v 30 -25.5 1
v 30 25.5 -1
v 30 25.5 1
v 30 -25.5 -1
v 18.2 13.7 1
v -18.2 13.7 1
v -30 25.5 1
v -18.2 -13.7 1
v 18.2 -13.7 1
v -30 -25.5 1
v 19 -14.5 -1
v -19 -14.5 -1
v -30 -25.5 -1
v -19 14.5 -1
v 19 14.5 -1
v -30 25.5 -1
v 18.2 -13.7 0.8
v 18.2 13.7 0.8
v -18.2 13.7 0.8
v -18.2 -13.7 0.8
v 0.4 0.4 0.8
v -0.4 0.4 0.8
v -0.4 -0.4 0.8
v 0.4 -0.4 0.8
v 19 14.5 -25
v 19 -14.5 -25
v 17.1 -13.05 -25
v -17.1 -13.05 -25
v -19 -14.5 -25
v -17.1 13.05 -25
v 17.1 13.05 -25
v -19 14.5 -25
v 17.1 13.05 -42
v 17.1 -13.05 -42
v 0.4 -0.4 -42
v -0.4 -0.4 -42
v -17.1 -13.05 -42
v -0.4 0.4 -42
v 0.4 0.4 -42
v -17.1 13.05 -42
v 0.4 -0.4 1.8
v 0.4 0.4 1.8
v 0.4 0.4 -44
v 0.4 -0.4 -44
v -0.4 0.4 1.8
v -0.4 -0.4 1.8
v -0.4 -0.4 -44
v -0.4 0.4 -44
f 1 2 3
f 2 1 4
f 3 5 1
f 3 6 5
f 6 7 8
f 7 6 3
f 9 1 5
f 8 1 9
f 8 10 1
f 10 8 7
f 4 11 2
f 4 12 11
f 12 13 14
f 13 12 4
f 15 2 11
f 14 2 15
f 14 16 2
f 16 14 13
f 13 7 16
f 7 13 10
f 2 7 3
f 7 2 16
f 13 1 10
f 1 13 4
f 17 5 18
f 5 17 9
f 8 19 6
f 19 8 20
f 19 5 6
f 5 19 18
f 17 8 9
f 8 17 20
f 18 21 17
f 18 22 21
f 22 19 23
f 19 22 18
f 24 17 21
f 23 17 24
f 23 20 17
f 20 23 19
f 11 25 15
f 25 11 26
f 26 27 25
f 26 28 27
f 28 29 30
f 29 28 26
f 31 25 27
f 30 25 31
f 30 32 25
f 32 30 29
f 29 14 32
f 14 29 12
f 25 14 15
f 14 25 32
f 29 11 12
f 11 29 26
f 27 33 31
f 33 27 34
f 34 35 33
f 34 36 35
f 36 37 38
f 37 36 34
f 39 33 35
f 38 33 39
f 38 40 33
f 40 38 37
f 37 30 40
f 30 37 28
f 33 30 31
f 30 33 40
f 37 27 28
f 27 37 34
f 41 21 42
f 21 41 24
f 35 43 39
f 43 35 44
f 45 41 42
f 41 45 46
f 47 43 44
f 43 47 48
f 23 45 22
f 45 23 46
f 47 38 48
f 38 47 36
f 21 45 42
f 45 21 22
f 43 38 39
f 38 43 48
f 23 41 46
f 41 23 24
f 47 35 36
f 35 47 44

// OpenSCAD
// Parameters
cutout_width_mm = 36; //[18:72:0.1]
cutout_height_mm = 27; //[13.5:54:0.1]
panel_thickness_mm = 2; //[1:6:0.1]
clearance_mm = 0.2; //[0:1:0.05]
include_mounting_holes = 0; //[0:1:1]
mounting_hole_diameter_mm = 3.2; //[2:6.4:0.1]
mounting_hole_pitch_x_mm = 40; //[20:80:0.1]
mounting_hole_pitch_y_mm = 0; //[0:40:0.1]
include_flange_clearance = 1; //[0:1:1]
flange_width_mm = 50; //[30:100:0.1]
flange_height_mm = 35; //[20:70:0.1]
panel_margin_mm = 12; //[6:30:0.5]
envelope_thickness_mm = 0.8; //[0.4:3:0.1]
carrier_web_thickness_mm = 0.8; //[0.4:3:0.1]
overlap_mm = 1; //[0.5:2:0.1]
iec_body_depth_mm = 25; //[12:60:0.5]
iec_body_clearance_mm = 1; //[0:5:0.1]
mod_block_depth_mm = 18; //[8:50:0.5]

// IEC Module - complete geometry
module iec() {
  color("DimGray") {
    // IEC Body
    cube([cutout_width_mm + 2*iec_body_clearance_mm, 
          cutout_height_mm + 2*iec_body_clearance_mm, 
          iec_body_depth_mm], center=true);
  }
}

// Mod Module - complete geometry
module mod() {
  color("Black") {
    // Mod Block
    cube([(cutout_width_mm + 2*iec_body_clearance_mm) * 0.9, 
          (cutout_height_mm + 2*iec_body_clearance_mm) * 0.9, 
          mod_block_depth_mm], center=true);
  }
}

// Panel with cutouts
module panel_with_cutouts() {
  color("Silver") {
    difference() {
      // Panel Reference Face
      cube([cutout_width_mm + 2*panel_margin_mm, 
            cutout_height_mm + 2*panel_margin_mm, 
            panel_thickness_mm], center=true);
      // Panel Cutout Rect
      translate([0, 0, 0])
        cube([cutout_width_mm + 2*clearance_mm, 
              cutout_height_mm + 2*clearance_mm, 
              panel_thickness_mm + 2*overlap_mm], center=true);
      // Mounting Holes
      if (include_mounting_holes) {
        translate([mounting_hole_pitch_x_mm/2, mounting_hole_pitch_y_mm/2, 0])
          cylinder(h=panel_thickness_mm + 2*overlap_mm, 
                   r=(mounting_hole_diameter_mm + 2*clearance_mm)/2, center=true);
        translate([-mounting_hole_pitch_x_mm/2, -mounting_hole_pitch_y_mm/2, 0])
          cylinder(h=panel_thickness_mm + 2*overlap_mm, 
                   r=(mounting_hole_diameter_mm + 2*clearance_mm)/2, center=true);
      }
    }
  }
}

// Flange Clearance Envelope
module flange_clearance_envelope() {
  if (include_flange_clearance) {
    color("Silver") {
      translate([0, 0, panel_thickness_mm/2 + envelope_thickness_mm/2 - overlap_mm])
        cube([flange_width_mm + 2*clearance_mm, 
              flange_height_mm + 2*clearance_mm, 
              envelope_thickness_mm], center=true);
    }
  }
}

// Carrier Web
module carrier_web() {
  color("Silver") {
    translate([0, 0, (envelope_thickness_mm - iec_body_depth_mm - mod_block_depth_mm)/2])
      cube([carrier_web_thickness_mm, 
            carrier_web_thickness_mm, 
            panel_thickness_mm + envelope_thickness_mm + iec_body_depth_mm + mod_block_depth_mm], center=true);
  }
}

// Assembly
module assembly() {
  panel_with_cutouts();
  flange_clearance_envelope();
  translate([0, 0, -panel_thickness_mm/2 - iec_body_depth_mm/2 + overlap_mm]) iec();
  translate([0, 0, -panel_thickness_mm/2 - iec_body_depth_mm - mod_block_depth_mm/2 + 2*overlap_mm]) mod();
  carrier_web();
}

assembly();
